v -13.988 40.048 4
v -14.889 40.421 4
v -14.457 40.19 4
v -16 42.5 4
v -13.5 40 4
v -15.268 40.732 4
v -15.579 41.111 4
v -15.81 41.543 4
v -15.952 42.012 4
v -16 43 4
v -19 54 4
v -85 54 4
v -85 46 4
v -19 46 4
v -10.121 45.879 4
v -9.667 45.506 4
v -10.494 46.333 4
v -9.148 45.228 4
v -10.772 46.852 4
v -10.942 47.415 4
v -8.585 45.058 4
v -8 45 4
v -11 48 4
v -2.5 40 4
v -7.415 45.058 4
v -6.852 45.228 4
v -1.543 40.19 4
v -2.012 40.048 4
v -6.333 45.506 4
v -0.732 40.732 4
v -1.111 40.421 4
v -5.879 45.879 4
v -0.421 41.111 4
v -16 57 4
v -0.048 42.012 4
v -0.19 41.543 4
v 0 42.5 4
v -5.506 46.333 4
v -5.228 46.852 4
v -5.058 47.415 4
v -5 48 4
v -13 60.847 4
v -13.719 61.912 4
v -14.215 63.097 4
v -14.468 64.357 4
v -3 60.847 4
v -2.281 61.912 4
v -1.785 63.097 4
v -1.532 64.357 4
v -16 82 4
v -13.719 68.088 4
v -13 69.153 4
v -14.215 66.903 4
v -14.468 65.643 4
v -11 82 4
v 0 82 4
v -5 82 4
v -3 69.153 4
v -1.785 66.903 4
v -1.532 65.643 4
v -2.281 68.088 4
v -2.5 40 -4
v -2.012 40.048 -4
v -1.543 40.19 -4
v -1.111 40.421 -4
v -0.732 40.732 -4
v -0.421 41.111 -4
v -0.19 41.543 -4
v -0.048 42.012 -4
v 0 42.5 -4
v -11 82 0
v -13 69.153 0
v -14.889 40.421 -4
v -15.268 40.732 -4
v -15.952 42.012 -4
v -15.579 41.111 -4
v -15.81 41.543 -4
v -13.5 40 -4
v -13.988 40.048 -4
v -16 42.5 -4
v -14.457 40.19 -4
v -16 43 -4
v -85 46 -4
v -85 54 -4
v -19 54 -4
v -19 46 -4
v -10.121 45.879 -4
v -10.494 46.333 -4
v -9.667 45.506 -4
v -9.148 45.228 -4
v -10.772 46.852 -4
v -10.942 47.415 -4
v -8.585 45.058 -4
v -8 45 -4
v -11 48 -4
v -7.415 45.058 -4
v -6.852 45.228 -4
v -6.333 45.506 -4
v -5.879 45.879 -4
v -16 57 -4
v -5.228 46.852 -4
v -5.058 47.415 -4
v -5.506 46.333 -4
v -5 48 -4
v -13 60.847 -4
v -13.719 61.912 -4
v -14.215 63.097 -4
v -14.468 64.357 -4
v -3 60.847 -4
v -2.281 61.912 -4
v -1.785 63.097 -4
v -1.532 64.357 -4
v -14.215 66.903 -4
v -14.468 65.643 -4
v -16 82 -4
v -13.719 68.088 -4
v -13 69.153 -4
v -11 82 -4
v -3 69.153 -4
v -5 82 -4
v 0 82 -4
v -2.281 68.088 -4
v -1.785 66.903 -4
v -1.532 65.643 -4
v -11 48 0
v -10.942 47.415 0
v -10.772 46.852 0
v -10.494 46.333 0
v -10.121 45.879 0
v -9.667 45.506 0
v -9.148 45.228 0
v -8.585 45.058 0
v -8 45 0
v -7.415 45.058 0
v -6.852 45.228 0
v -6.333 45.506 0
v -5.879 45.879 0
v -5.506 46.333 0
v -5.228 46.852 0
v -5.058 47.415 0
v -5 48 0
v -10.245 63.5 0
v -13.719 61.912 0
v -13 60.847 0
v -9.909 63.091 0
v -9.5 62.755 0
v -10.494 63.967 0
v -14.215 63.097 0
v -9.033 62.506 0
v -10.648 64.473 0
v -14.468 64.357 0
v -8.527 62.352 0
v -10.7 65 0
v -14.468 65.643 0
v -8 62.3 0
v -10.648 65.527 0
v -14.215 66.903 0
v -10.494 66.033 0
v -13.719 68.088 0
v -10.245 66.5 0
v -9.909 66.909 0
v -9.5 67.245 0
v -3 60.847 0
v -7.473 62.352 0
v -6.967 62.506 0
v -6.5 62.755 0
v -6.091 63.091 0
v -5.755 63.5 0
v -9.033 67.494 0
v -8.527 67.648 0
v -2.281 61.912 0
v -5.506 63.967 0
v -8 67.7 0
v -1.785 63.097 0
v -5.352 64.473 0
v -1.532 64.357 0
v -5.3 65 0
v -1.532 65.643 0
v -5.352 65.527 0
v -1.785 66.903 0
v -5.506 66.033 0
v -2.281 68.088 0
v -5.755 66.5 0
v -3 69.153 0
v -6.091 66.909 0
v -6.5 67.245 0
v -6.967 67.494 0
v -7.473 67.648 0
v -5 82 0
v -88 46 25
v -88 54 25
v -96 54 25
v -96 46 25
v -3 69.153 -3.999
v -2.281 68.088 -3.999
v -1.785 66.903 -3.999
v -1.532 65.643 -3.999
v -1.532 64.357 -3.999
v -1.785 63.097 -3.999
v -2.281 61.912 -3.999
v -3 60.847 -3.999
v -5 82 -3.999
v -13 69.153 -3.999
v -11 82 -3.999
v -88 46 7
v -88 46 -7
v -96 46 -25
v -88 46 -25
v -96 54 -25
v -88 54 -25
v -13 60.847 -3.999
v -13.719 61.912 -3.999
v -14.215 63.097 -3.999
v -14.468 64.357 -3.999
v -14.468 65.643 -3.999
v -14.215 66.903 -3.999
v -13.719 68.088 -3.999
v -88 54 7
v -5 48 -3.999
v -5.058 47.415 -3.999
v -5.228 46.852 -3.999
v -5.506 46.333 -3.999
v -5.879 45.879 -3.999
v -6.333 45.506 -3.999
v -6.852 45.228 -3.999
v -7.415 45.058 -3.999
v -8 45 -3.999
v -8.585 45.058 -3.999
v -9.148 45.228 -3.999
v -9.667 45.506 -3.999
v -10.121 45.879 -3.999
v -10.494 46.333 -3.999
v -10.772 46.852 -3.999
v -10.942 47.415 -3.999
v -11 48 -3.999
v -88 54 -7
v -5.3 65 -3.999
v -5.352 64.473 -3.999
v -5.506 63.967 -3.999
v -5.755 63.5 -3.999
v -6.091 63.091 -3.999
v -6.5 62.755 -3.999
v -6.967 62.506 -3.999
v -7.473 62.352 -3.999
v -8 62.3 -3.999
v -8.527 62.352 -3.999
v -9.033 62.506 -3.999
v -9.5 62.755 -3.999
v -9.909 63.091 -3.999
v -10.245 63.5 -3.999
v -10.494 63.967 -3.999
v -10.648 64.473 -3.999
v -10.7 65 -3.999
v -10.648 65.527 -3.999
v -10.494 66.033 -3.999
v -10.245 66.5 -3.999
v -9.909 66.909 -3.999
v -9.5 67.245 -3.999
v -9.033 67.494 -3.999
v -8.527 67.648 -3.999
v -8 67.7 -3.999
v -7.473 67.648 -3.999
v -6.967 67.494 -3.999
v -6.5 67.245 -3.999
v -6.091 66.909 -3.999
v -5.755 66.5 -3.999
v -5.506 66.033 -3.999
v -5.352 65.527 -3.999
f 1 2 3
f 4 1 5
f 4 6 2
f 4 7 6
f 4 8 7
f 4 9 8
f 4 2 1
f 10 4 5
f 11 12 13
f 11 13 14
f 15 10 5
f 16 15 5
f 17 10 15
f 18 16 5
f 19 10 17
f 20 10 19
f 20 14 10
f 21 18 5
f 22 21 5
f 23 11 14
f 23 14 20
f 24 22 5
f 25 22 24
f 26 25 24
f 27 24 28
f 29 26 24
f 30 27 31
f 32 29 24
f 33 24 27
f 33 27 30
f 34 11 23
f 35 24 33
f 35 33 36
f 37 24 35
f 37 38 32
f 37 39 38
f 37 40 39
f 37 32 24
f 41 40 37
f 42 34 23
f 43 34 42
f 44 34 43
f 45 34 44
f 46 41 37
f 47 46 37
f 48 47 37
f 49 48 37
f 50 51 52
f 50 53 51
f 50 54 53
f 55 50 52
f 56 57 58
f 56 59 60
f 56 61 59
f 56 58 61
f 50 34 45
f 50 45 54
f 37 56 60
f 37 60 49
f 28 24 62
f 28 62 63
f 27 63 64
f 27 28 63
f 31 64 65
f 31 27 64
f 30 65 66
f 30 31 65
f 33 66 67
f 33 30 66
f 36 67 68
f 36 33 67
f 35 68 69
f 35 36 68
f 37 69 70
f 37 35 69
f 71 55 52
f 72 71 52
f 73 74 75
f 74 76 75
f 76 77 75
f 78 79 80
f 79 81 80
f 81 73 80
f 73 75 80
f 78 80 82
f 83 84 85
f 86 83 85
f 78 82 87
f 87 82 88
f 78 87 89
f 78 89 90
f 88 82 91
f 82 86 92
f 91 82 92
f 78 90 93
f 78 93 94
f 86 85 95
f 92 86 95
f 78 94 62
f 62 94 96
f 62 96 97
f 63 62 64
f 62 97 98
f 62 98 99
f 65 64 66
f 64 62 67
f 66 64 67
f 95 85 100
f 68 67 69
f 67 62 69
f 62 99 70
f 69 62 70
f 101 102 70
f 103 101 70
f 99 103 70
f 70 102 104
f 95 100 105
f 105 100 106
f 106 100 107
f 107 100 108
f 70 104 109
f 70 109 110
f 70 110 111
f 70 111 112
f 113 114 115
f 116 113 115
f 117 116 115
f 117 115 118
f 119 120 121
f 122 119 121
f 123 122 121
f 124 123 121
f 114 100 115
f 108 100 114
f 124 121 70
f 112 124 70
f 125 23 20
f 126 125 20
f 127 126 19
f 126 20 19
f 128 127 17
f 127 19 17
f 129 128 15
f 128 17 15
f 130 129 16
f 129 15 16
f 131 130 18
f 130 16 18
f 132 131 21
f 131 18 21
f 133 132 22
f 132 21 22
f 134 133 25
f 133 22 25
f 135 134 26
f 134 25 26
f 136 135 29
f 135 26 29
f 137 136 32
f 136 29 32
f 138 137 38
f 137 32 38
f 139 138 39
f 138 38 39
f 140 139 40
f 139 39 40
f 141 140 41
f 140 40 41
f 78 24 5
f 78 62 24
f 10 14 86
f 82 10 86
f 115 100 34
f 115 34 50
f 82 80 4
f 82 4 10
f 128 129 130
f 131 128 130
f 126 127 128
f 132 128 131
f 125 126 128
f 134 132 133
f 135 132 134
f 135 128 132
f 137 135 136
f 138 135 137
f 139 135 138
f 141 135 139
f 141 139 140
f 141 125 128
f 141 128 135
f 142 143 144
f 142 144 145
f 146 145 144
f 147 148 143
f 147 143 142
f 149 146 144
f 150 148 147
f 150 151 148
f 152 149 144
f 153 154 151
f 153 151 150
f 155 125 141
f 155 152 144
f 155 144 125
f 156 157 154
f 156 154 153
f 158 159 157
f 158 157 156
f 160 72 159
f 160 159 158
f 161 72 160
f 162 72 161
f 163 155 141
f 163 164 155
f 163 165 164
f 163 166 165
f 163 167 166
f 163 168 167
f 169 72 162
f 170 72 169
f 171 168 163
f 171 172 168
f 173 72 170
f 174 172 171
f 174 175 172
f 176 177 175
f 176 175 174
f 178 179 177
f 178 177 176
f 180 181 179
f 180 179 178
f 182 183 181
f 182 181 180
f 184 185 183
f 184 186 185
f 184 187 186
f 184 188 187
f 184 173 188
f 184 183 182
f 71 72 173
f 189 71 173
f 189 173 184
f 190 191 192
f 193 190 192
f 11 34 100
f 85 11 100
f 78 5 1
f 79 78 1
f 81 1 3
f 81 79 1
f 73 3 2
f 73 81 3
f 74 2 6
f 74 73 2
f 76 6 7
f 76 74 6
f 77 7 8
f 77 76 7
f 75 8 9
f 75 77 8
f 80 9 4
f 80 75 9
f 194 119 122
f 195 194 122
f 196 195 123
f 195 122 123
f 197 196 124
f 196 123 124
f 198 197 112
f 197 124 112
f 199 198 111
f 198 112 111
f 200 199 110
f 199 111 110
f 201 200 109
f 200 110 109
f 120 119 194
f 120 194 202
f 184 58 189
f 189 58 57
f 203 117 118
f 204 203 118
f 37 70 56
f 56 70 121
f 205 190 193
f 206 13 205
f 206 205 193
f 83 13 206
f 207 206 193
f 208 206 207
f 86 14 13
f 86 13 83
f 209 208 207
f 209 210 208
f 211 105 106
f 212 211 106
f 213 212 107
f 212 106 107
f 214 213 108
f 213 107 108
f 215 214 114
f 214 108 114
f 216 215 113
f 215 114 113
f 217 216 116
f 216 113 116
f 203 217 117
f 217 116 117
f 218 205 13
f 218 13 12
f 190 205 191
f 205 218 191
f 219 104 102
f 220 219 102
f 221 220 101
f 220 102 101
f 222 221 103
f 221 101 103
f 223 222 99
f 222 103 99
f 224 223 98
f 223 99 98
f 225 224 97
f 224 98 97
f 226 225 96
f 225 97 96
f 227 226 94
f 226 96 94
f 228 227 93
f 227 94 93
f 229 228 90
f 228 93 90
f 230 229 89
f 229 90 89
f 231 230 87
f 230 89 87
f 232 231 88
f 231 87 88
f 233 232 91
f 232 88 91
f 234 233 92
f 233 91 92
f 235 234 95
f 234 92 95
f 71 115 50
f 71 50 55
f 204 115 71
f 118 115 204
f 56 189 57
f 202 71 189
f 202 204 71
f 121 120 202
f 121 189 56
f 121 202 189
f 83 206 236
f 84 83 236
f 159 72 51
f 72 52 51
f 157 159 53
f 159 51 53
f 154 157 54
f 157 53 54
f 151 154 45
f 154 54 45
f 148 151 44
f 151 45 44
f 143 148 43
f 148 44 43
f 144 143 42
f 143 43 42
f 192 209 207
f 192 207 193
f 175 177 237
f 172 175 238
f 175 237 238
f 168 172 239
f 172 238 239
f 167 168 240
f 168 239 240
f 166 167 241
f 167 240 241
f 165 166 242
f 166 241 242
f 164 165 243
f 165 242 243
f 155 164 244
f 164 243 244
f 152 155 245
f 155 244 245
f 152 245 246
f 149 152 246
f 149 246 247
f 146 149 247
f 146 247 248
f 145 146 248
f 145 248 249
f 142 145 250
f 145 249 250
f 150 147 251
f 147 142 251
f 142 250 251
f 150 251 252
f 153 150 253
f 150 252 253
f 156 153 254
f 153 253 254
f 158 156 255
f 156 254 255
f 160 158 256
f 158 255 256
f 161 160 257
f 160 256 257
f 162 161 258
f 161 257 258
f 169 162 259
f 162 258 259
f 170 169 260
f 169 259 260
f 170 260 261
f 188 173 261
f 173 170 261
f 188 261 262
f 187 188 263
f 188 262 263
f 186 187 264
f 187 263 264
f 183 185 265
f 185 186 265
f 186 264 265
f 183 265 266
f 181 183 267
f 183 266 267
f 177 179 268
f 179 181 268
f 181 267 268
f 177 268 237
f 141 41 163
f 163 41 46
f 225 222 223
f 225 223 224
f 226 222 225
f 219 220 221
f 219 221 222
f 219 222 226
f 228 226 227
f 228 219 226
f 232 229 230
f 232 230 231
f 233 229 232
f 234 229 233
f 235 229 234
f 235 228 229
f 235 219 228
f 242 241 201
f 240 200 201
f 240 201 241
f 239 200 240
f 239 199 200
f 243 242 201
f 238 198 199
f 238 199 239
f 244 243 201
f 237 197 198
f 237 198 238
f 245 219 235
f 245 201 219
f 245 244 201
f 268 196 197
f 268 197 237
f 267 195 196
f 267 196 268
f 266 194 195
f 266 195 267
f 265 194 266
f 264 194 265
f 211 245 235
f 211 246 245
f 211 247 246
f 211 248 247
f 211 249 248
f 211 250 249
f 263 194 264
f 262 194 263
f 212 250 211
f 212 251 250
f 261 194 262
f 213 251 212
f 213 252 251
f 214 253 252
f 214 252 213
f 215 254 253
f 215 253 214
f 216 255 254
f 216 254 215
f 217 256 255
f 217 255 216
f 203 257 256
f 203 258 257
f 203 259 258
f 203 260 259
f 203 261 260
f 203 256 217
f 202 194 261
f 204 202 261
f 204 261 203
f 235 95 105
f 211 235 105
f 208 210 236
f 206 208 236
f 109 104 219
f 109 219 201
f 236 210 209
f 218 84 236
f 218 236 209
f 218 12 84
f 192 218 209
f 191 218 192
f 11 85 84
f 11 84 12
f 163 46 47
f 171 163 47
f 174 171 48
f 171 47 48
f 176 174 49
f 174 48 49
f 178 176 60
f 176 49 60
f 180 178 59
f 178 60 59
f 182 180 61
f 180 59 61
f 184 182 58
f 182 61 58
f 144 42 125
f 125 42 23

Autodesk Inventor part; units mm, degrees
ref_plane "YZ Plane" through (0, 0, 0) normal (1, 0, 0) x (0, 1, 0)
ref_plane "XZ Plane" through (0, 0, 0) normal (0, 1, 0) x (-1, 0, 0)
ref_plane "XY Plane" through (0, 0, 0) normal (0, 0, 1) x (1, 0, 0)
sketch "Skizze2" plane through (0, 0, 0) normal (0, 0, 1) x (1, 0, 0)
  line L0 (-19.9249, 0) -> (3.9249, 0) projected
  line L1 (0, -18.1036) -> (0, 108.6213) projected
  circle A0 centre (-8, 65) radius 2.7
  line L2 (0, 0) -> (0, 87.5)
  arc A1 (0, 87.5) -> (-2.5, 90) centre (-2.5, 87.5) ccw
  line L3 (-13.5, 90) -> (-2.5, 90)
  arc A2 (-13.5, 90) -> (-16, 87.5) centre (-13.5, 87.5) ccw
  line L4 (0, 42.5) -> (0, 87.5)
  line L5 (-16, 40) -> (-16, 87.5)
  line L6 (0, 40) -> (-16, 40)
  point P0 (-8, 90)
  dimension "d4" = 2.5
  dimension "d5" = 2.5
  dimension "d6" = 5.4
  dimension "d8" = 25
  dimension "d17" = 2.5
  dimension "d18" = 2.5
  dimension "d19" = 2.5
  dimension "d144" = 25
extrude "Extrusion1" add sketch "Skizze2" along normal mid plane 8
sketch "Skizze7" plane through (0, 0, -4) normal (0, 0, -1) x (-1, 0, 0)
  arc A0 (16, 87.5) -> (13.5, 90) centre (13.5, 87.5) ccw projected
  line L0 (13.5, 90) -> (2.5, 90) projected
  arc A1 (2.5, 90) -> (0, 87.5) centre (2.5, 87.5) ccw projected
  line L1 (0, 87.5) -> (0, 40) projected
  circle A2 centre (8, 65) radius 2.7 projected
  circle A3 centre (8, 65) radius 6.5
  line L2 (8, 85) -> (8, 45)
  line L3 (13, 82.2483) -> (13, 48.2483)
  line L4 (3, 48.3648) -> (3, 82.3648)
  line L5 (16, 40) -> (16, 87.5) projected
  line L6 (0, 40) -> (16, 40) projected
  circle A4 centre (8, 82) radius 3
  circle A5 centre (8, 48) radius 3
  line L7 (-2, 82) -> (18, 82)
  line L8 (-2, 48) -> (18, 48)
  line L9 (5, 48) -> (3, 60.8467)
  line L10 (11, 48) -> (13, 60.8467)
  line L11 (3, 69.1533) -> (5, 82)
  line L12 (13, 69.1533) -> (11, 82)
  point P0 (0, 0)
  point P1 (8, 65)
  dimension "d133" = 13
  dimension "d136" = 20
  dimension "d137" = 20
  dimension "d194" = 6
  dimension "d195" = 6
  dimension "d196" = 3
  dimension "d197" = 3
  dimension "d198" = 10
  dimension "d199" = 20
  dimension "d200" = 20
extrude "Extrusion5" cut sketch "Skizze7" against normal blind 0.001 contours L8 L2 A5 | A5 L2 L8 | A5 L2 A3 L10 | L3 A3 L2 A2 | A3 L3 | A3 L2 A4 L12 | L7 L2 A4 | A4 L2 L7 | A5 L8 L2 | A5 L9 A3 L2 | L2 L8 A5 | L2 A2 A3 L4 | A3 L11 A4 L2 | L2 L7 A4 | A4 L7 L2 | L4 A3
fillet "Rundung2" radius 2.5 2 edges at (0, 40, 0) (-16, 40, 0)
sketch "Skizze12" plane through (-16, 40, 4) normal (-1, 0, 0) x (0, 0, 1)
  line L0 (0, 47.5) -> (0, 0) projected
  line L1 (-8, 0) -> (-8, 47.5) projected
  line L2 (0, 47.5) -> (0, 2.5) projected
  line L3 (-8, 47.5) -> (0, 47.5) projected
  line L4 (-8, 2.5) -> (-8, 47.5) projected
  line L5 (0, 6) -> (-8, 6)
  line L6 (-8, 6) -> (-8, 14)
  line L7 (-8, 14) -> (0, 14)
  line L8 (0, 14) -> (0, 6)
  line L9 (0, 2.5) -> (-8, 2.5) projected
  point P0 (-4, -40)
  point P1 (0, 8)
  point P2 (-4, 20.6699)
  point P3 (0, 14)
  dimension "d184" = 8
extrude "Extrusion10" add sketch "Skizze12" along normal blind 80 contours L0 L5 L1 L7
sketch "Skizze17" plane through (-16, 54, 4) normal (0, 1, 0) x (1, 0, 0)
  line L0 (-80, 0) -> (-80, 8) projected
  line L1 (-72, 29) -> (-80, 29)
  line L2 (-72, -21) -> (-80, -21)
  line L3 (-80, 29) -> (-80, -21)
  line L4 (-72, 29) -> (-72, -21)
  line L5 (0, 8) -> (0, 0) projected
  line L6 (0, 8) -> (-80, 8) projected
  line L7 (-80, 0) -> (-80, 8) projected
  line L8 (0, 0) -> (-80, 0) projected
  line L9 (-80, 4) -> (0, 4)
  point P0 (16, 4)
  point P1 (-80, 8)
  dimension "d187" = 50
  dimension "d188" = 8
extrude "Extrusion15" add sketch "Skizze17" against normal blind 8 contours L8 L4 L2 L3 | L0 L9 L4 L8 | L0 L6 L4 L9 | L3 L1 L4 L6
chamfer "Fasen10" distance 3 angle 45 4 edges at (-16, 46, 0) (-16, 54, 0) (-88, 50, -4) (-88, 50, 4)
sketch "Skizze18" plane through (0, 0, 4) normal (0, 0, 1) x (1, 0, 0)
  circle A0 centre (-8, 65) radius 2.7 projected
  arc A1 (-13, 69.1533) -> (-13, 60.8467) centre (-8, 65) ccw projected
  line L0 (-11, 82) -> (-13, 69.1533) projected
  arc A2 (-5, 82) -> (-11, 82) centre (-8, 82) ccw projected
  line L1 (-3, 69.1533) -> (-5, 82) projected
  arc A3 (-3, 60.8467) -> (-3, 69.1533) centre (-8, 65) ccw projected
  line L2 (-5, 48) -> (-3, 60.8467) projected
  arc A4 (-11, 48) -> (-5, 48) centre (-8, 48) ccw projected
  line L3 (-13, 60.8467) -> (-11, 48) projected
  circle A5 centre (-8, 65) radius 2.7 projected
  point P0 (0, 0)
extrude "Extrusion16" cut sketch "Skizze18" against normal blind 4
sketch "Skizze19" plane through (-13.5, 90, 4) normal (0, 1, 0) x (1, 0, 0)
  line L0 (11, 0) -> (0, 0) projected
  line L1 (0, 8) -> (11, 8) projected
  line L2 (11, 8) -> (11, 0) projected
  line L3 (13.5, 0) -> (11, 0) projected
  line L4 (13.5, 8) -> (13.5, 0) projected
  line L5 (11, 8) -> (13.5, 8) projected
  line L6 (-2.5, 8) -> (-2.5, 0) projected
  line L7 (0, 0) -> (-2.5, 0) projected
  line L8 (0, 0) -> (0, 8) projected
  line L9 (-2.5, 8) -> (0, 8) projected
  point P0 (13.5, 4)
extrude "Extrusion17" cut sketch "Skizze19" against normal blind 8
properties part number "Gripper neu"
